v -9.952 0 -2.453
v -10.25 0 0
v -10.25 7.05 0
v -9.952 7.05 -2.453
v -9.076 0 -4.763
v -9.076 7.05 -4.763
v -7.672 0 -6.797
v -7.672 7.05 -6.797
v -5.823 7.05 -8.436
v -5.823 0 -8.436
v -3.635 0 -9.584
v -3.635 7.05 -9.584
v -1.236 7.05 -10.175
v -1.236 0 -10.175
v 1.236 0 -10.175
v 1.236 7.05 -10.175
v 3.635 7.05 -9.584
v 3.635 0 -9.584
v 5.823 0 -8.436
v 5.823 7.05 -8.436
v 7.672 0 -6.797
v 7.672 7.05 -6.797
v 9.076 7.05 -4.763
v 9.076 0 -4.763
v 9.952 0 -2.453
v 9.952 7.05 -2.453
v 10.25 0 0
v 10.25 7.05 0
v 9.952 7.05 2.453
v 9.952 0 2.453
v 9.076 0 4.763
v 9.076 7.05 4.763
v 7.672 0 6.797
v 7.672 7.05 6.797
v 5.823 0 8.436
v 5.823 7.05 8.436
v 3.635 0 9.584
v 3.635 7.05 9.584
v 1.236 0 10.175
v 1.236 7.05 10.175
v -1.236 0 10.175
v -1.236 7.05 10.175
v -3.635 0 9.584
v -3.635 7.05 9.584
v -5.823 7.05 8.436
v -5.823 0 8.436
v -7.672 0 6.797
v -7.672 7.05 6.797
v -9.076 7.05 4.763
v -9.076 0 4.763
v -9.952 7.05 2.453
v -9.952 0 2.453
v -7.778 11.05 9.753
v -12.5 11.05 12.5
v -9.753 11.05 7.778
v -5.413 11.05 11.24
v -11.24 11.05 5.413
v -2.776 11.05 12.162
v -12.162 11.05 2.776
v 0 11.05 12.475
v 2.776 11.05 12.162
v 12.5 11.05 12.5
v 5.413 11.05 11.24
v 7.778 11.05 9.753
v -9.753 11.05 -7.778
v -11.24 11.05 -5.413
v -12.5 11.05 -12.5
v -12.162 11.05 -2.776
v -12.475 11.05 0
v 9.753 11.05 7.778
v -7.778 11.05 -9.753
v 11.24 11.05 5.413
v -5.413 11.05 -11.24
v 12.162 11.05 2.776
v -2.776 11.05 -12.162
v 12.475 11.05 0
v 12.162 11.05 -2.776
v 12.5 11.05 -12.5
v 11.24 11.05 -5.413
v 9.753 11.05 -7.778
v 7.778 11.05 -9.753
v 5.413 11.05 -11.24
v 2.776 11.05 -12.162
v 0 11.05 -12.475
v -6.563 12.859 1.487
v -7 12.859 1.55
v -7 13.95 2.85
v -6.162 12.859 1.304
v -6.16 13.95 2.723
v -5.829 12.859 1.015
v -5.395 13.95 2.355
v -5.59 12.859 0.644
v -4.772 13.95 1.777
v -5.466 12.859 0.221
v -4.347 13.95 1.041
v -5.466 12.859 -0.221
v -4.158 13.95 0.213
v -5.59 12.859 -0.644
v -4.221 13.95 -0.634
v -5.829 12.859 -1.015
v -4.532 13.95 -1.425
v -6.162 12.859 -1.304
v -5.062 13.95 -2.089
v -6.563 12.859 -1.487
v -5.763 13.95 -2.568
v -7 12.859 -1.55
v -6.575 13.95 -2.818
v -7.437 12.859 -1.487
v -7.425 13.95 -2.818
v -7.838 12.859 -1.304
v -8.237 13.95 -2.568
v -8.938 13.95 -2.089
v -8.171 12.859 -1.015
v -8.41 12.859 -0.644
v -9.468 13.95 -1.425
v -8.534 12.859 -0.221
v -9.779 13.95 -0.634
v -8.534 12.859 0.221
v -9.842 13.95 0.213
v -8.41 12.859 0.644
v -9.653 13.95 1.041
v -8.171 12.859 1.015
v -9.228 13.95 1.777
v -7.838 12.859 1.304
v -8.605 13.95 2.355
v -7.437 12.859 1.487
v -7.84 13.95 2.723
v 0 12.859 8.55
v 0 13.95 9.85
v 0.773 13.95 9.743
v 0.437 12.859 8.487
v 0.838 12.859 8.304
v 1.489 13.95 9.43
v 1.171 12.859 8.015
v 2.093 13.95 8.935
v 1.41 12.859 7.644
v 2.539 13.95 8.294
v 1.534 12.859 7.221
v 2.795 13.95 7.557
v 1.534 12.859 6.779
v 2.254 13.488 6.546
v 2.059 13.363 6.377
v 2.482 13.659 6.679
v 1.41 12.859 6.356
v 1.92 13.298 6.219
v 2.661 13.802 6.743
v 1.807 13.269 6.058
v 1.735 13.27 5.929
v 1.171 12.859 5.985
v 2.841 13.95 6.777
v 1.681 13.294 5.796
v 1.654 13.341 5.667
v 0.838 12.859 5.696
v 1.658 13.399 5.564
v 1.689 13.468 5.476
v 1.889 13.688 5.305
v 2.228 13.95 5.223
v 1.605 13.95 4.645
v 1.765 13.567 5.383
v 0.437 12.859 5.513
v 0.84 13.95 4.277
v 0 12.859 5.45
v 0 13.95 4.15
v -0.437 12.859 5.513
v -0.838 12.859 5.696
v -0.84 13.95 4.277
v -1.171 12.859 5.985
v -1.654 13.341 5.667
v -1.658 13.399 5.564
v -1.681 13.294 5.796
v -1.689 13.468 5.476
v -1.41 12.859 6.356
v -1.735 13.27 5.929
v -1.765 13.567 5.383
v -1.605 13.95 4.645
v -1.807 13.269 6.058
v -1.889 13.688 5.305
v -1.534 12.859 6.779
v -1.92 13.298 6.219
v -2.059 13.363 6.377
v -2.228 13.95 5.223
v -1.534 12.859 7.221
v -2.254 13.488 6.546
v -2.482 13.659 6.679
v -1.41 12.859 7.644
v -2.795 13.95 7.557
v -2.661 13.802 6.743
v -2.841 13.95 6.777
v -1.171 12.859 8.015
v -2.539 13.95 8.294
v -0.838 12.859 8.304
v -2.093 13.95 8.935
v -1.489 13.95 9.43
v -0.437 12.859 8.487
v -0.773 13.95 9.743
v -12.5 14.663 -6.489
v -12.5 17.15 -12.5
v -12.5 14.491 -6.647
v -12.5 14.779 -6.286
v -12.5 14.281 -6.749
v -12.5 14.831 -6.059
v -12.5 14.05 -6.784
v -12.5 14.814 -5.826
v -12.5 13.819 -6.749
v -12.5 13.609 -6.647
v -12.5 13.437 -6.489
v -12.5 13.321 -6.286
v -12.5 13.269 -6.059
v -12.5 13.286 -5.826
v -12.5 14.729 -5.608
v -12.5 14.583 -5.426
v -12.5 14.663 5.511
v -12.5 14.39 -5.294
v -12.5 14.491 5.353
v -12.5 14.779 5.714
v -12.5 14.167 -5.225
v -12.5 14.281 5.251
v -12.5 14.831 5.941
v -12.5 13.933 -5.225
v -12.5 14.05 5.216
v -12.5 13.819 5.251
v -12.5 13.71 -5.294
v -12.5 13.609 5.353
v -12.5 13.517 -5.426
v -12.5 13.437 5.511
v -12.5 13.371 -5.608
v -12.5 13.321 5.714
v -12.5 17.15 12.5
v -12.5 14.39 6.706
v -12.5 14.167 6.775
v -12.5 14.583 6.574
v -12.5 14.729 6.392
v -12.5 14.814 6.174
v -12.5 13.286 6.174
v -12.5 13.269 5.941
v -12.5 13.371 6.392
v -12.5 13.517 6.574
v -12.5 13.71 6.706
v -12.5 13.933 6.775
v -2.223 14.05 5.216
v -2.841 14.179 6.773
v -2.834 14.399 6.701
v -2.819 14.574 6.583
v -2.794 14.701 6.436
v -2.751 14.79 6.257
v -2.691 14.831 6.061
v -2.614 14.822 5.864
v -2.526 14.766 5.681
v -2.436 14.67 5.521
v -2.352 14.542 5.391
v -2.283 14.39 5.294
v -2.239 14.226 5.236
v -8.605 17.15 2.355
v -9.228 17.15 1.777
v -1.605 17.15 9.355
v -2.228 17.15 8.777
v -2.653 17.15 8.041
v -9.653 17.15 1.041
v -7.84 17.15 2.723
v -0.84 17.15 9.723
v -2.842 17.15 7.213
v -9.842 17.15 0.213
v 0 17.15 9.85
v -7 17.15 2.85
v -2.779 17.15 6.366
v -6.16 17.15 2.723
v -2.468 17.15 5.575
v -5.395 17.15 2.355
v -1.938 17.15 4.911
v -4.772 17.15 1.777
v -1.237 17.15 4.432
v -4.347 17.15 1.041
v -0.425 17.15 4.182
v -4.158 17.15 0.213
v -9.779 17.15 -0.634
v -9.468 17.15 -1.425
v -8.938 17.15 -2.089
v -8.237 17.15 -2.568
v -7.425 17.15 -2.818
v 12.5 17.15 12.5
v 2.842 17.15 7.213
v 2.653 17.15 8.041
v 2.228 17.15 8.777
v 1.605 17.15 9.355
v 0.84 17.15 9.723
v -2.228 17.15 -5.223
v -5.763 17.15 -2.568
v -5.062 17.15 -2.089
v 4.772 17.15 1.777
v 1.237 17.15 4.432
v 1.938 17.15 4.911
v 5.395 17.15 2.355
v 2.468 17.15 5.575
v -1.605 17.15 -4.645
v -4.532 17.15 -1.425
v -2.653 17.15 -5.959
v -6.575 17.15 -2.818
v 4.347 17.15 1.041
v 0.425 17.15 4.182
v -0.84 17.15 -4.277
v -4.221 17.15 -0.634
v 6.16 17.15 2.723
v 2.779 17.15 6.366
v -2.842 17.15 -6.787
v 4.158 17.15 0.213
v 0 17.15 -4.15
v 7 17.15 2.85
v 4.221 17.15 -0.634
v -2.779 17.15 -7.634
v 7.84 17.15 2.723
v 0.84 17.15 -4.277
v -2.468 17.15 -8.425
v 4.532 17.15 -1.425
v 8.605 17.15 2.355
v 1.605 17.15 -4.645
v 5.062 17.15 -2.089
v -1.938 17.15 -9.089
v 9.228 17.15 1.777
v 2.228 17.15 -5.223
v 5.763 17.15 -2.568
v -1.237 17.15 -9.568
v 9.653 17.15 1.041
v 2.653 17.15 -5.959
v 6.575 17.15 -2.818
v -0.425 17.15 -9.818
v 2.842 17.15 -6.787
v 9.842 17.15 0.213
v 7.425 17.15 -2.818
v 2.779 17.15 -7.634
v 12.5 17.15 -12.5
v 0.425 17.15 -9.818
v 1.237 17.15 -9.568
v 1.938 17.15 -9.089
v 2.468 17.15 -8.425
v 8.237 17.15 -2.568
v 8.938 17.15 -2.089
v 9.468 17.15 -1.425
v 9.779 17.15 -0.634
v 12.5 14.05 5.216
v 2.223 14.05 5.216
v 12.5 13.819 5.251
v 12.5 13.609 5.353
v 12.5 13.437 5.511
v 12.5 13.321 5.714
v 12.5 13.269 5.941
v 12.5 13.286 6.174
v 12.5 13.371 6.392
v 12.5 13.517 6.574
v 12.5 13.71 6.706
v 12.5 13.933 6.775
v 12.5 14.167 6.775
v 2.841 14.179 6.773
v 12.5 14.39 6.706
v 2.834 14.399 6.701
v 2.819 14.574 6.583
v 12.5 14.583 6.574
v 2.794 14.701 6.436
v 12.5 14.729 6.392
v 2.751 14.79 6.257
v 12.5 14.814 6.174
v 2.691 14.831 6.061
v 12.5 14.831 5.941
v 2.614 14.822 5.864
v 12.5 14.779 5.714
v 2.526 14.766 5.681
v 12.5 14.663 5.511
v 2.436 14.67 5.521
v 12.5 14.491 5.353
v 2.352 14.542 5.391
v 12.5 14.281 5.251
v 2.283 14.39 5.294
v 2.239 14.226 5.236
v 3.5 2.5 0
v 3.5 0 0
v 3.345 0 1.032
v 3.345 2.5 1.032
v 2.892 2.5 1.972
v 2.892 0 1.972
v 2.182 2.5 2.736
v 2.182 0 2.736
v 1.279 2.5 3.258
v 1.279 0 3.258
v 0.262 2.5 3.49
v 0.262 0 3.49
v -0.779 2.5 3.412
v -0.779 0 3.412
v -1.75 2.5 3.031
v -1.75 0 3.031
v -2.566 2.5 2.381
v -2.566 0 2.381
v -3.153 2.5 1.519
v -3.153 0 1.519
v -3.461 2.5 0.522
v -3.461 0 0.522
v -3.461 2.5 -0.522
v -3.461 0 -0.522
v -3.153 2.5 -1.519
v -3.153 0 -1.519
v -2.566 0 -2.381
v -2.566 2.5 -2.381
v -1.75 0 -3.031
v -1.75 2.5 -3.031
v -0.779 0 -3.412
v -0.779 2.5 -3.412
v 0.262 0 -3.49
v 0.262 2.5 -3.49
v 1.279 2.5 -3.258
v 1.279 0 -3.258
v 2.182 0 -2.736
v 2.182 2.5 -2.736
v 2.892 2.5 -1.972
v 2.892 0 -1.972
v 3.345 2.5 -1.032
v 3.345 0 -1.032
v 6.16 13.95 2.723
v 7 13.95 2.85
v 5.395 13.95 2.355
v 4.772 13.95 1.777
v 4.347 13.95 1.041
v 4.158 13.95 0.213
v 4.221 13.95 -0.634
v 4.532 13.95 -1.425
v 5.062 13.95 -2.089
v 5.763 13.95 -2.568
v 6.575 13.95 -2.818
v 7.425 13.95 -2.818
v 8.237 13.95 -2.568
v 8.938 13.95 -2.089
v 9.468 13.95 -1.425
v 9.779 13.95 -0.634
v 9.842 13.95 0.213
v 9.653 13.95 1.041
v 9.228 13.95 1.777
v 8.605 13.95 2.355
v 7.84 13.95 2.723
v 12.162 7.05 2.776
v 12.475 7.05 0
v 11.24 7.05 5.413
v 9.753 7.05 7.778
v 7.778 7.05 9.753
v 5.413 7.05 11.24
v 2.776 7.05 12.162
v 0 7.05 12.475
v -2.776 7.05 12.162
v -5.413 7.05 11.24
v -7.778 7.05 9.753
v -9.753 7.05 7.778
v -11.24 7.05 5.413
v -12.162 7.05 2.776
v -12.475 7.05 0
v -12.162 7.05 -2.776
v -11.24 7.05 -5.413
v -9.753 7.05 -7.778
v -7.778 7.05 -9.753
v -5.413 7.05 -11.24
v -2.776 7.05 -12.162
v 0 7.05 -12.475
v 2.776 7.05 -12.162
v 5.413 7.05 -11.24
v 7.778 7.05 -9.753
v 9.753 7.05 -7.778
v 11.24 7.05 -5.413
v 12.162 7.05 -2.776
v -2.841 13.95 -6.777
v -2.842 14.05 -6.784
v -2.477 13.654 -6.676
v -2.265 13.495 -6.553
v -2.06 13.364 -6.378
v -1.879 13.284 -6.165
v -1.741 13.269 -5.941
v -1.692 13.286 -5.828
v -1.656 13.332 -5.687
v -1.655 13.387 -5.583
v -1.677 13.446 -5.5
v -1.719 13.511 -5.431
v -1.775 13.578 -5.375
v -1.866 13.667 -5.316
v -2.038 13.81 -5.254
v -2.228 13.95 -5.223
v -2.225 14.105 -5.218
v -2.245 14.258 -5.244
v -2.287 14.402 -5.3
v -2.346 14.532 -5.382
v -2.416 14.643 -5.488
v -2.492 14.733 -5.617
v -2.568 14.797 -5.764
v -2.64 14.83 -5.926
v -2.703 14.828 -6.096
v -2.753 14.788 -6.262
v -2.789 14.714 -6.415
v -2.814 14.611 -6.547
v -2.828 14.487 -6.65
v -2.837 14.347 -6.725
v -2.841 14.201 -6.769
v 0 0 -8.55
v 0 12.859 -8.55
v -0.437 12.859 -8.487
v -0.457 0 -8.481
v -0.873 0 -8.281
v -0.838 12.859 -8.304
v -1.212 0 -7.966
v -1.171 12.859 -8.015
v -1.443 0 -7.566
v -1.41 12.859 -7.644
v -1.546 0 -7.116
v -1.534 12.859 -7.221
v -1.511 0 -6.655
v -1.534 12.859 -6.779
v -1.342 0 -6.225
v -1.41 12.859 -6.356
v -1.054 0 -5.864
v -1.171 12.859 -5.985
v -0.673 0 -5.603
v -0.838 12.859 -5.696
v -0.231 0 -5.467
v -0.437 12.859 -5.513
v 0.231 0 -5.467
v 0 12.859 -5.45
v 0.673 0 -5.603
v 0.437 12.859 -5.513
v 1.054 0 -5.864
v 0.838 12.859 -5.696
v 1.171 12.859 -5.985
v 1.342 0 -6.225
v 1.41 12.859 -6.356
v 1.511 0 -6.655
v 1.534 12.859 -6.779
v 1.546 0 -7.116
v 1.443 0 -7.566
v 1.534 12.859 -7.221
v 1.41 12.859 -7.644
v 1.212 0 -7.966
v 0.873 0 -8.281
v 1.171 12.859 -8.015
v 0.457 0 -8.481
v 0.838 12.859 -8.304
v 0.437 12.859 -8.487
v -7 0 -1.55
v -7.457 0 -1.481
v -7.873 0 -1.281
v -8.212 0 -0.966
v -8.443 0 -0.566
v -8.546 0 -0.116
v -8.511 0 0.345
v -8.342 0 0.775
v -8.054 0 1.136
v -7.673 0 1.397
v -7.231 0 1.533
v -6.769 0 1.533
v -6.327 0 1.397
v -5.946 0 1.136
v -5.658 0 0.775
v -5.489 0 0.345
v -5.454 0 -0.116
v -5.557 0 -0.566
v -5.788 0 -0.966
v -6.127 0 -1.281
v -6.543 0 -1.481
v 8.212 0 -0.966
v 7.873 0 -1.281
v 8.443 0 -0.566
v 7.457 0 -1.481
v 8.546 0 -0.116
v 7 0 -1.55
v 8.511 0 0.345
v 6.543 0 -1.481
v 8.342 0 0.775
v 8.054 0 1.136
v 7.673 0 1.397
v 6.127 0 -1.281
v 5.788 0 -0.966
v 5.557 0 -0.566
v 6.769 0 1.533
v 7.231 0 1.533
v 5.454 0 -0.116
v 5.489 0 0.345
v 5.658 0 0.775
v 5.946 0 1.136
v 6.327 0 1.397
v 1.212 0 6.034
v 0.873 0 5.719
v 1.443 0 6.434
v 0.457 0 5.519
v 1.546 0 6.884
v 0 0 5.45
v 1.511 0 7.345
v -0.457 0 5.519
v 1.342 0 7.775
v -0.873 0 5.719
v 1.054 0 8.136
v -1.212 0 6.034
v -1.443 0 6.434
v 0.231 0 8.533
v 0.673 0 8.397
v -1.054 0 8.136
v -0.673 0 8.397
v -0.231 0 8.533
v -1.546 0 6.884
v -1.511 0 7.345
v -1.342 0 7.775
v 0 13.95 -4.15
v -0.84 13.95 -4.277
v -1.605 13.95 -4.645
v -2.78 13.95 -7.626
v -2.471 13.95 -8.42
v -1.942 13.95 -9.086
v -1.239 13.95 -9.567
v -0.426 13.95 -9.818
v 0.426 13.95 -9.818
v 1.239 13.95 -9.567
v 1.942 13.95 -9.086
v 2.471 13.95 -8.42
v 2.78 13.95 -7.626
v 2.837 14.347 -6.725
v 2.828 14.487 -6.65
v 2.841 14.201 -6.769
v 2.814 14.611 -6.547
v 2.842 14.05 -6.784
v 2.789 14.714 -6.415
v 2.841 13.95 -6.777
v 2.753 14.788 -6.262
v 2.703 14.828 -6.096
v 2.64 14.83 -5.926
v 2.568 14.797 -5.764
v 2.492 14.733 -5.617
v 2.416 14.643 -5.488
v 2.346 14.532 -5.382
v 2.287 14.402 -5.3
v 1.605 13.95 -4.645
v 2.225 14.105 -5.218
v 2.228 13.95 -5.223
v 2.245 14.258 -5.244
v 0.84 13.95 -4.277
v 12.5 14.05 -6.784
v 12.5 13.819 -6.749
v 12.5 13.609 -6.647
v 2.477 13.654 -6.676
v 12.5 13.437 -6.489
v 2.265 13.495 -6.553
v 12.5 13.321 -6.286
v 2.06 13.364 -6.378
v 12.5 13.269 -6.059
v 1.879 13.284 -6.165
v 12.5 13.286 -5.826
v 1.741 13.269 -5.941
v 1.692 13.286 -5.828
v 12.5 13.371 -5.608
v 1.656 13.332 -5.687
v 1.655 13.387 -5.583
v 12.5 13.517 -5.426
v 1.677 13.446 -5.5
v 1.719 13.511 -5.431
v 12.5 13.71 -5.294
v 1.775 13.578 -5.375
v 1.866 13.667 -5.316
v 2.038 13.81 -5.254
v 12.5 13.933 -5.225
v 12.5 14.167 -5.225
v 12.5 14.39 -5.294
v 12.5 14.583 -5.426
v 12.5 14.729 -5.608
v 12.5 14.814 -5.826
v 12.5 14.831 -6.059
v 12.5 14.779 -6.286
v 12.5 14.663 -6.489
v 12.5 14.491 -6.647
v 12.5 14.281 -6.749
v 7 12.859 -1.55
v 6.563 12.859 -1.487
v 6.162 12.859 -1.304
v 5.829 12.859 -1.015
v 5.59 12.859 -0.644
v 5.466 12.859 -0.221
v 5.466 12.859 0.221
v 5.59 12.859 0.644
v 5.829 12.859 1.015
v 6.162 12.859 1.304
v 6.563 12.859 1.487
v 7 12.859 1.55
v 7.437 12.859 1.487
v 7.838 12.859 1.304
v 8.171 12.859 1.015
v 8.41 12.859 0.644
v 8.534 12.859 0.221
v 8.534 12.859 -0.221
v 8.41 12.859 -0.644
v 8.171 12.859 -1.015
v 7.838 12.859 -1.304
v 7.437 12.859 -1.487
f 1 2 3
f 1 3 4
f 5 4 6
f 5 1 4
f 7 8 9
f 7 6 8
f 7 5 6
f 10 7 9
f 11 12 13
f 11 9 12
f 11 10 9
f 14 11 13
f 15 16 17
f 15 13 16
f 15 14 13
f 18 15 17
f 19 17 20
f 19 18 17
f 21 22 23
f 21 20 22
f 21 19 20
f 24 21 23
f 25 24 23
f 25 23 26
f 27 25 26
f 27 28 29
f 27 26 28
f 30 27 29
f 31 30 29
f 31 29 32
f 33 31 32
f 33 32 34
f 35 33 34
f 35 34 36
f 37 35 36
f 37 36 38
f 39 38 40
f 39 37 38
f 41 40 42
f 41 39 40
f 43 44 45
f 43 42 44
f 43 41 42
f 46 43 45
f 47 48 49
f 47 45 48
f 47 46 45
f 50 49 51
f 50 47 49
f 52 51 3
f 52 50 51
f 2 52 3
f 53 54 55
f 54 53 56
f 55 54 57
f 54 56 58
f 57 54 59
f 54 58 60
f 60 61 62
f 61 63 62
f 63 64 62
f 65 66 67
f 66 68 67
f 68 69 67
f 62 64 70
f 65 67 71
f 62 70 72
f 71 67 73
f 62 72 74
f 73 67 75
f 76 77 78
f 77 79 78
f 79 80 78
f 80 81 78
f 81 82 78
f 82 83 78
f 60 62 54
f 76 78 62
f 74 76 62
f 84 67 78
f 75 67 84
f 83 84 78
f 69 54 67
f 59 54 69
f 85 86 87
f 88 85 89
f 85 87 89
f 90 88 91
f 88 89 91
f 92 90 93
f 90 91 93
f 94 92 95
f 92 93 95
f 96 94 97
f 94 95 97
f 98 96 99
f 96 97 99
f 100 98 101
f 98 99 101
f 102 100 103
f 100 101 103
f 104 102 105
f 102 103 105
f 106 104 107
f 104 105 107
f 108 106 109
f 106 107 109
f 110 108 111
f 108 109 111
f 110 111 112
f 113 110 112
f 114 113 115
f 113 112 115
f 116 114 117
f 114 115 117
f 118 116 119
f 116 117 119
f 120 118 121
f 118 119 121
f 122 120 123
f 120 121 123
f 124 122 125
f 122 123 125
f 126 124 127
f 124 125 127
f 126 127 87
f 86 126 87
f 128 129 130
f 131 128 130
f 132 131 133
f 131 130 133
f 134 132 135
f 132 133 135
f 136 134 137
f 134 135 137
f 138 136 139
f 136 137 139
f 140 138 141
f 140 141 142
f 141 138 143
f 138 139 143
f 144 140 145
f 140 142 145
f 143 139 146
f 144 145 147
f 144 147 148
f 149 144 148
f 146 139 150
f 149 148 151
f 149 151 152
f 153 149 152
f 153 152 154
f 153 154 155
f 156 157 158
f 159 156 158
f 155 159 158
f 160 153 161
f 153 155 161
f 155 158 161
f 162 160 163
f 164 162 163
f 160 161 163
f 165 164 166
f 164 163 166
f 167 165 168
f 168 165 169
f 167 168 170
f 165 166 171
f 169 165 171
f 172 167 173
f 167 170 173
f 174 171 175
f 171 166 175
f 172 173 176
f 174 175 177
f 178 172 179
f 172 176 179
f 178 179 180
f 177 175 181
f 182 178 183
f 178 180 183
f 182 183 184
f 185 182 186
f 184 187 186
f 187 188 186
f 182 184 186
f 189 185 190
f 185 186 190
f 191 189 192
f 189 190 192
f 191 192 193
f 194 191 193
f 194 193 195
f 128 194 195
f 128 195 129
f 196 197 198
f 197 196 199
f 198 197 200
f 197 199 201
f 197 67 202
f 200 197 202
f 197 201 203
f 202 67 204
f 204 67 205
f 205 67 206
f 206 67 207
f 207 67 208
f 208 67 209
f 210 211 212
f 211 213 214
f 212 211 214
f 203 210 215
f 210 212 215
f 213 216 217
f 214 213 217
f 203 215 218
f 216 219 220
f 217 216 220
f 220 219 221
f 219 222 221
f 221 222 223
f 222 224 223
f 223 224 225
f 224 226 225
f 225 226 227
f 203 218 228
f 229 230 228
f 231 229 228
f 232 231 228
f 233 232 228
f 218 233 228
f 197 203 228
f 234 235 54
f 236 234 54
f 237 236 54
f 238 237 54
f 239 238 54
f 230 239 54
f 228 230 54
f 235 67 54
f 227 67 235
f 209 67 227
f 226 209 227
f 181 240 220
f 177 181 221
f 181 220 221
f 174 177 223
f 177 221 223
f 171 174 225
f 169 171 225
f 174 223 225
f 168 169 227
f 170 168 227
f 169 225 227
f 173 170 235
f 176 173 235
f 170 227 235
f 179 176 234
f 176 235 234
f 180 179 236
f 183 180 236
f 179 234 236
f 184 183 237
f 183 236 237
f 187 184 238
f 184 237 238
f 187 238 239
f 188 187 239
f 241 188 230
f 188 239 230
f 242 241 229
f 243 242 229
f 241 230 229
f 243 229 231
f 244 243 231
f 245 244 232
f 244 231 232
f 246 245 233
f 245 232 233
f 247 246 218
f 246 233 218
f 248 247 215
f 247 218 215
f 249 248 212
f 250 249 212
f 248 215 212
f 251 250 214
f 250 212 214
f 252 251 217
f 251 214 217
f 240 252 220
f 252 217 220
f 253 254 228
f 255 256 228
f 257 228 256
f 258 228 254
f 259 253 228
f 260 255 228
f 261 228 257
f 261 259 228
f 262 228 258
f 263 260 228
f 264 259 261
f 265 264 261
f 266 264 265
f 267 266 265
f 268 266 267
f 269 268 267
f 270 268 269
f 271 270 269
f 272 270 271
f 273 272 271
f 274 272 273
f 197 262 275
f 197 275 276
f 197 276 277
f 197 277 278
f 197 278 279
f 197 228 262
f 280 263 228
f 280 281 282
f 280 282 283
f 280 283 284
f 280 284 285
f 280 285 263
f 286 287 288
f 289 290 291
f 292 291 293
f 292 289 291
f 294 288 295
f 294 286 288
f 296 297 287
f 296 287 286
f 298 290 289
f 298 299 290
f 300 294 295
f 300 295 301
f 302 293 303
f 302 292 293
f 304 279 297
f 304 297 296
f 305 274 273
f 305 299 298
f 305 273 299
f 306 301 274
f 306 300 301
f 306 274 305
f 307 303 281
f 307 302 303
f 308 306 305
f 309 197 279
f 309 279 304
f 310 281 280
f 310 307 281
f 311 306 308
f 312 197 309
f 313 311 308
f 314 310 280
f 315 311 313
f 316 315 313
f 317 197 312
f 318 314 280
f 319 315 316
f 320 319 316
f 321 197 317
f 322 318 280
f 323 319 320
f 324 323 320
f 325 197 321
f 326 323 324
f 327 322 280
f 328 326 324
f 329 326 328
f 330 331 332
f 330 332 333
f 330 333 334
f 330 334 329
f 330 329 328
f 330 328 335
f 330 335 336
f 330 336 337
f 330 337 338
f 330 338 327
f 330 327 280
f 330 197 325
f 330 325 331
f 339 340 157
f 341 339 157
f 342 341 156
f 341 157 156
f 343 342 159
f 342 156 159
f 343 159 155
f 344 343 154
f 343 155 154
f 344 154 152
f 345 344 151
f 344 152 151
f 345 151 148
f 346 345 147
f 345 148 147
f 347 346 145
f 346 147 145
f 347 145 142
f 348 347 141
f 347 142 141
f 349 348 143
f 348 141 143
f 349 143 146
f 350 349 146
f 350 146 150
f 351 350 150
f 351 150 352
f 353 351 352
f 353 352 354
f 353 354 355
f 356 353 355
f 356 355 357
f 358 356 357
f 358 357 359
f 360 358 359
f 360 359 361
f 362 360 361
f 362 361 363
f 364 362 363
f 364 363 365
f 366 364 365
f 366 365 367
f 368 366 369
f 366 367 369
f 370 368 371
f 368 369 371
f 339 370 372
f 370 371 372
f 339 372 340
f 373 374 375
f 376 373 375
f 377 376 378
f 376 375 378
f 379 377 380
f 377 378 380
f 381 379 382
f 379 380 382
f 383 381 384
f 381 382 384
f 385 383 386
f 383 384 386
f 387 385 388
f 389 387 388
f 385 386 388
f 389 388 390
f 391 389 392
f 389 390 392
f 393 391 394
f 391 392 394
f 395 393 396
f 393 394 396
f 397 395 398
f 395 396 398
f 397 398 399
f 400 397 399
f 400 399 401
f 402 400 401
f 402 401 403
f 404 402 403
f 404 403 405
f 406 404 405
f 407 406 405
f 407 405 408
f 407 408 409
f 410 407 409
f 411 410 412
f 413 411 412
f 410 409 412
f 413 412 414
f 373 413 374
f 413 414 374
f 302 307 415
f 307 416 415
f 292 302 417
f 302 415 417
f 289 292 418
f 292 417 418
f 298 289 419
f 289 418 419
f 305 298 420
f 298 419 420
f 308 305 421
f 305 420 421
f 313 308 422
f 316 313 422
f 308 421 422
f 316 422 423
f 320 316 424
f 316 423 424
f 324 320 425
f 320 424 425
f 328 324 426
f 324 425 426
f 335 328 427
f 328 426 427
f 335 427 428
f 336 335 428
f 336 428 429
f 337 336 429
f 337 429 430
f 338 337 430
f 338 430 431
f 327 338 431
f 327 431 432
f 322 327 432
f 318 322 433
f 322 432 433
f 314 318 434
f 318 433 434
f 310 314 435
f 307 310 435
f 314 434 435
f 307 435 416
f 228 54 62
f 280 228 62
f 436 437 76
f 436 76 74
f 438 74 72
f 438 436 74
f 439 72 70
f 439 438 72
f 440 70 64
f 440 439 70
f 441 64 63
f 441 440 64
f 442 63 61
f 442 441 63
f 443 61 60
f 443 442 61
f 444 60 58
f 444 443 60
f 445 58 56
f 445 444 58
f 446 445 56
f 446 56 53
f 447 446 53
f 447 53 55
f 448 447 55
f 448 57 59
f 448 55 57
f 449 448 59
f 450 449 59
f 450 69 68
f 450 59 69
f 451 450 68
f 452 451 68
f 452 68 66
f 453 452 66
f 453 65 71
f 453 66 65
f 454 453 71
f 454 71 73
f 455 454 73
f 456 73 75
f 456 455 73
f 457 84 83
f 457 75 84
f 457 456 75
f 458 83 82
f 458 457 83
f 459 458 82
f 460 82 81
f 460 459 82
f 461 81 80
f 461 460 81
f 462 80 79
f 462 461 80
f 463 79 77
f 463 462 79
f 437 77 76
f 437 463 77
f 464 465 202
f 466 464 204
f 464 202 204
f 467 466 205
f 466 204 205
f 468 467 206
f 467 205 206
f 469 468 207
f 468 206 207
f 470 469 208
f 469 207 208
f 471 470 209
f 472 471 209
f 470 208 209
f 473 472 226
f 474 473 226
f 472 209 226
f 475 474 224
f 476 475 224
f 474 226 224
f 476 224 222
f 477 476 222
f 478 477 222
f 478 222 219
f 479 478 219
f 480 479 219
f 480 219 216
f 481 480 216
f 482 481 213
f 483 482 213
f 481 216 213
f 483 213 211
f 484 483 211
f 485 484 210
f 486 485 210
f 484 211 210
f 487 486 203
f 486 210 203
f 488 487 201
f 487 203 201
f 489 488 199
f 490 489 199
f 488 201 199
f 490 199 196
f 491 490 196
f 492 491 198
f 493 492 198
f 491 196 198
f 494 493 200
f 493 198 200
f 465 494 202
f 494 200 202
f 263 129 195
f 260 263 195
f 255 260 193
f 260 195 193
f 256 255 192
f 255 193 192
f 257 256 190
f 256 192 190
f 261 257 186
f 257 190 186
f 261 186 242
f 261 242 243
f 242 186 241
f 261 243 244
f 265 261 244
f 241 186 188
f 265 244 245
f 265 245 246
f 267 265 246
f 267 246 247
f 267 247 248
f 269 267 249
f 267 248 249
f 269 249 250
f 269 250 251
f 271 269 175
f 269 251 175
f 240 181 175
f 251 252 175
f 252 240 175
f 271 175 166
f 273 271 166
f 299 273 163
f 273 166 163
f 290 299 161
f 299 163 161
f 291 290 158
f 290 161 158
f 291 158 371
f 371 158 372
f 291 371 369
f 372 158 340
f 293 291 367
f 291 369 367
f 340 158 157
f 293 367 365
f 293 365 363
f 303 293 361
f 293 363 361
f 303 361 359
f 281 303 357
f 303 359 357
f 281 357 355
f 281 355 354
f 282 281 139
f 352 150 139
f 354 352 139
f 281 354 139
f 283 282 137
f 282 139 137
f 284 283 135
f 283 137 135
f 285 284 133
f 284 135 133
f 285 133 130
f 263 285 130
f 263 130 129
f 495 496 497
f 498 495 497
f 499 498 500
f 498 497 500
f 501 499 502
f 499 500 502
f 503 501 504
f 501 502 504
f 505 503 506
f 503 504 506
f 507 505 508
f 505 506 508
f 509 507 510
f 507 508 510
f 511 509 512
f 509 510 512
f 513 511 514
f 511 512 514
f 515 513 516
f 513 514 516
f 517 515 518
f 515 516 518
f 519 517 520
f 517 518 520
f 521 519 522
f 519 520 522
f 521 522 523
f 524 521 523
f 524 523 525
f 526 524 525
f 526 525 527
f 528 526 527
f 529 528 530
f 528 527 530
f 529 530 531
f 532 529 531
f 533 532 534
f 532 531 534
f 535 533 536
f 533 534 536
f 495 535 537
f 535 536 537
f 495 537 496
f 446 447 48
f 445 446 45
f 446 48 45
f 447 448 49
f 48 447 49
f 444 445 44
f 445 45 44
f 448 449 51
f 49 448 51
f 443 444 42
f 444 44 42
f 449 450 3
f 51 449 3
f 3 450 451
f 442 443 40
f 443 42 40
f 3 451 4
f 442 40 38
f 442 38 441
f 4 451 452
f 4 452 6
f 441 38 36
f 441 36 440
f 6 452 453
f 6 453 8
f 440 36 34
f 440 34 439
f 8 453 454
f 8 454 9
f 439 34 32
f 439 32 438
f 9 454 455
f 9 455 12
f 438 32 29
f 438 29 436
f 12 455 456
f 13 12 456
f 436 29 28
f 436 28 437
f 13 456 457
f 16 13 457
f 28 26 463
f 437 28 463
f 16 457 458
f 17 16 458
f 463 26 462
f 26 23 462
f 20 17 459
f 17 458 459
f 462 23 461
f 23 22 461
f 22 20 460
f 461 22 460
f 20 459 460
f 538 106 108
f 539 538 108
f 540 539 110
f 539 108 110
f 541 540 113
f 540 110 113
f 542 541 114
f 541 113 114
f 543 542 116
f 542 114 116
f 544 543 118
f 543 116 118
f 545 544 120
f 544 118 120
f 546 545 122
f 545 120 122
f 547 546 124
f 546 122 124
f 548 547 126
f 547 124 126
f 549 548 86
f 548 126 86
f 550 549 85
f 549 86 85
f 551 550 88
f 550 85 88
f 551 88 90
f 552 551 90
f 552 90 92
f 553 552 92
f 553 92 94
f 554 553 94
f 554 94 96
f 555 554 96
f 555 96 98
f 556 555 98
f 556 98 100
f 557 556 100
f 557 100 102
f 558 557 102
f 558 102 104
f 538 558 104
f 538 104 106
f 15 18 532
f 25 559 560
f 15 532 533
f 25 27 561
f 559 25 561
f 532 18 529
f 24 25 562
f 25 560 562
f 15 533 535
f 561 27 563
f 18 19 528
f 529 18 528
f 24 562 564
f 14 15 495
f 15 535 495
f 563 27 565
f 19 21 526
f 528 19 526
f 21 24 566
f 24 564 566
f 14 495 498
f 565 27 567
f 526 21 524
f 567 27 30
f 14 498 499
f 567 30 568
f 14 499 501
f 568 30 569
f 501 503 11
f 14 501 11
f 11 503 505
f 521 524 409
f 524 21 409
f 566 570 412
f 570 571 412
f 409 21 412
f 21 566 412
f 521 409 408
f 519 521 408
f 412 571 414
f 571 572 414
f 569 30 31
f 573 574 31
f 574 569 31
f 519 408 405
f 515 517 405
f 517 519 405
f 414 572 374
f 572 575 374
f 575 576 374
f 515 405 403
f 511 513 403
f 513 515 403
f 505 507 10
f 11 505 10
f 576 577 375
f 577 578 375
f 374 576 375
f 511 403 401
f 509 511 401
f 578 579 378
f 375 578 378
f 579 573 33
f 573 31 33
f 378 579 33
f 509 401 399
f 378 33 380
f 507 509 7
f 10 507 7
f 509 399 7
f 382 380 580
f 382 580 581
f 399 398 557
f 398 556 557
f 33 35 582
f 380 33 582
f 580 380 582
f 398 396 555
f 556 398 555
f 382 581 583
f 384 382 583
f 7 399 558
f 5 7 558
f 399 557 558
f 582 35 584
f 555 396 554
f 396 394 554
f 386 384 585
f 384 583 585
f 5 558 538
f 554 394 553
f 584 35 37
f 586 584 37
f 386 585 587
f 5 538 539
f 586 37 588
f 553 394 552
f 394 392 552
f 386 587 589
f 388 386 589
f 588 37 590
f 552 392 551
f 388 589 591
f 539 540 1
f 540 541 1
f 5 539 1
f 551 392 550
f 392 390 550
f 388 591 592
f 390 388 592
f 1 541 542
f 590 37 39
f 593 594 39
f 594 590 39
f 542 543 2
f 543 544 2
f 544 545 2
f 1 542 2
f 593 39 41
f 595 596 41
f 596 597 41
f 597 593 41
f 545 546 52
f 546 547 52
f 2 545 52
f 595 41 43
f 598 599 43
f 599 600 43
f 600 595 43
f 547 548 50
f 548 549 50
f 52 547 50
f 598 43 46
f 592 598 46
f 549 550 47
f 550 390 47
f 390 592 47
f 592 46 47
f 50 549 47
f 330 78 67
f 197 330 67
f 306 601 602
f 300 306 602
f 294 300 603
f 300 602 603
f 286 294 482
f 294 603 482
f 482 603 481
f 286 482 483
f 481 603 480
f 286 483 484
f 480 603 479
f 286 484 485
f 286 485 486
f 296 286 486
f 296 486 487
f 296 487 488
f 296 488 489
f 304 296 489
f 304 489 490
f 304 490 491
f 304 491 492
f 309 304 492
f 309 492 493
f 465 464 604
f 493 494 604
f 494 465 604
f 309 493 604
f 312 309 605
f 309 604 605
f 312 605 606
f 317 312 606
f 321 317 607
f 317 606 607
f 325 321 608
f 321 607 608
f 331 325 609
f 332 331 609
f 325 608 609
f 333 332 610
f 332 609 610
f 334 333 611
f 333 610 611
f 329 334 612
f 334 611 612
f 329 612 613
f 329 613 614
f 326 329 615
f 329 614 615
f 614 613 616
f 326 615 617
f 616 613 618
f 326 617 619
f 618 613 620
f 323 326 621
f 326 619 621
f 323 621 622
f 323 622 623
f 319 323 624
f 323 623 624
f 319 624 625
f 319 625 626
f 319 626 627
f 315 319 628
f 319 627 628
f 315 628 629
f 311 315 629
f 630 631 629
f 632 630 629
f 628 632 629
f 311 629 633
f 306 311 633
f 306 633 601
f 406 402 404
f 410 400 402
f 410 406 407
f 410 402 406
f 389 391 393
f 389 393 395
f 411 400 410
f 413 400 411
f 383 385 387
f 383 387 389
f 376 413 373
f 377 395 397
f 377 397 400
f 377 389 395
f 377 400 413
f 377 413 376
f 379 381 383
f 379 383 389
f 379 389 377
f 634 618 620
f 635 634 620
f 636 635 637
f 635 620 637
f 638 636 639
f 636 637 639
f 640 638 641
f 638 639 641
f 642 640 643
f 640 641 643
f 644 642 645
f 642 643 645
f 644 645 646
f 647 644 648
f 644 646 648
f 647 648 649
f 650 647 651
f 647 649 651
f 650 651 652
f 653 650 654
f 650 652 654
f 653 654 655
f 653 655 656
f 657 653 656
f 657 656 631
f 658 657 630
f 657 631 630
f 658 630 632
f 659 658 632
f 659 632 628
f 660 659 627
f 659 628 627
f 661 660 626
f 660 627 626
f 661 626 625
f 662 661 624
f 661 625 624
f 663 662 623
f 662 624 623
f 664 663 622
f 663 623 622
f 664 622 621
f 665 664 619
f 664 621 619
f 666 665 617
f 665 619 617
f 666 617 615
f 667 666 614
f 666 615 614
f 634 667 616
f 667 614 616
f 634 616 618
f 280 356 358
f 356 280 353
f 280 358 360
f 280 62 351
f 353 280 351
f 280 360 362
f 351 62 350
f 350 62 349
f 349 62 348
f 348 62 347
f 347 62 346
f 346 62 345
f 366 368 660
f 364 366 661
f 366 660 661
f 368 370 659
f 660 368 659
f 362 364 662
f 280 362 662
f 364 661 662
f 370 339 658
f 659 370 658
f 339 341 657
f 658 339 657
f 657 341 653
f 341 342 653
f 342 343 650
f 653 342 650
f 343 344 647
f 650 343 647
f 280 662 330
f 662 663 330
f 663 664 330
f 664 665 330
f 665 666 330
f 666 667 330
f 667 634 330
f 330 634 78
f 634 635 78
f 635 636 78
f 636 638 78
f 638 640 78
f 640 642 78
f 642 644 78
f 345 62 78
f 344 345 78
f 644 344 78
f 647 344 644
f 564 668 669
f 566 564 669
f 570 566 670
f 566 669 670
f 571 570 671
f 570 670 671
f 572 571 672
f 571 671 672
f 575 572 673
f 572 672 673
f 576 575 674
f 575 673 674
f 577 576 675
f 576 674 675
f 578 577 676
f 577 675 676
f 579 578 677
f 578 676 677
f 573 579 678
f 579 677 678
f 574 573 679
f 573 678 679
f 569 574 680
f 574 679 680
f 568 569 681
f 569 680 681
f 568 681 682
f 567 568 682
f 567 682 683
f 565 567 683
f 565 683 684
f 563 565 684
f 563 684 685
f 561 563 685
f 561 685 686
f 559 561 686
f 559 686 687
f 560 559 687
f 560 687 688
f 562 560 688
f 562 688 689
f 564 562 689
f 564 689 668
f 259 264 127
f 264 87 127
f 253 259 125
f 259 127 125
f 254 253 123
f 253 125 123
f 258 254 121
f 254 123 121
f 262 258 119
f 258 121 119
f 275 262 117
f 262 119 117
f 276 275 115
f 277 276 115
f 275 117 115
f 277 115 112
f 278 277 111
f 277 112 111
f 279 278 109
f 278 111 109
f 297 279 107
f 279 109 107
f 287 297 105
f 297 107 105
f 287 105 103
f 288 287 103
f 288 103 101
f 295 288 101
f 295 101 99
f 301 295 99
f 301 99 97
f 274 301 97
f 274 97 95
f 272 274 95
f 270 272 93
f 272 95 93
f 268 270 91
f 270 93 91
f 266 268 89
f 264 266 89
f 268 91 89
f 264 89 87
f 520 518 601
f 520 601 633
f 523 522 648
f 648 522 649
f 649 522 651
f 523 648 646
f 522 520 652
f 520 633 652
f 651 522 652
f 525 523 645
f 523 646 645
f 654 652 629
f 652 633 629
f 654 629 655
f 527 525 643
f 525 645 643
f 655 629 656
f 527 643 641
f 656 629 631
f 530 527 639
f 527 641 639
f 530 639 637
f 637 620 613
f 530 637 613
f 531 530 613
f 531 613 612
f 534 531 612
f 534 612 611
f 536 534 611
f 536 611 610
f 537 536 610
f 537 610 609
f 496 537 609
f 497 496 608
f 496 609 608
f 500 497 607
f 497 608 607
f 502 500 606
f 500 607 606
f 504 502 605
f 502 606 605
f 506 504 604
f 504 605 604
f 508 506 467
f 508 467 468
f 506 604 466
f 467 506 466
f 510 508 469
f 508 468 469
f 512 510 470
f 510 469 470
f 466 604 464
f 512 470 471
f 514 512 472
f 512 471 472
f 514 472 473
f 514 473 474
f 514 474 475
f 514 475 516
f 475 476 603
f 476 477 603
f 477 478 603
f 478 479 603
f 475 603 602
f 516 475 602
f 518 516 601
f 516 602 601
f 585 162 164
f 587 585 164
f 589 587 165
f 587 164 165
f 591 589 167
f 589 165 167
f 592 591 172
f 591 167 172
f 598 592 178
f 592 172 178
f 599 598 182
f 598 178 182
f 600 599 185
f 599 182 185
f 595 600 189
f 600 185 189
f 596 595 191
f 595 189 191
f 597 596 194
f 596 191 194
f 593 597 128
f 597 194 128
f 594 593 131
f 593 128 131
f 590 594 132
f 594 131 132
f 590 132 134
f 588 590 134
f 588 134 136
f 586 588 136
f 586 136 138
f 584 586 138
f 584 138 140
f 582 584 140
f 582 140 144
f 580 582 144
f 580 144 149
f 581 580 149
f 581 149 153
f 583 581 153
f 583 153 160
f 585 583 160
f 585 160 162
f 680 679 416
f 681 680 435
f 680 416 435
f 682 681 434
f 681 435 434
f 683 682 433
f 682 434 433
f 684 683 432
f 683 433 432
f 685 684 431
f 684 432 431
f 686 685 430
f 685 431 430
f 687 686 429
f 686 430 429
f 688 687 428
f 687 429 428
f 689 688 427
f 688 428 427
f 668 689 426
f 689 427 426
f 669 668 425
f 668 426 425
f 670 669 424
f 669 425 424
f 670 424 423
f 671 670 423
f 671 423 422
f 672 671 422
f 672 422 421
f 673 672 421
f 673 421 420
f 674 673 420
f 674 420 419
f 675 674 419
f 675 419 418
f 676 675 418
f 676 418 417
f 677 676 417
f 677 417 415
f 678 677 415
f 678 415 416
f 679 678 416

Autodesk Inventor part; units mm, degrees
ref_plane "YZ Plane" through (0, 0, 0) normal (1, 0, 0) x (0, 1, 0)
ref_plane "XZ Plane" through (0, 0, 0) normal (0, 1, 0) x (-1, 0, 0)
ref_plane "XY Plane" through (0, 0, 0) normal (0, 0, 1) x (1, 0, 0)
sketch "Sketch1" plane through (0, 0, 0) normal (0, 1, 0) x (-1, 0, 0)
  circle A0 centre (0, 0) radius 10.25
  dimension "d0" = 20.5
extrude "Extrusion1" add sketch "Sketch1" along normal blind 7.05
sketch "Sketch2" plane through (0, 7.05, 0) normal (0, 1, 0) x (1, 0, 0)
  circle A0 centre (0, 0) radius 12.475
  dimension "d3" = 24.95
extrude "Extrusion2" add sketch "Sketch2" along normal blind 4
sketch "Sketch3" plane through (0, 11.05, 0) normal (0, 1, 0) x (1, 0, 0)
  circle A0 centre (0, 0) radius 12.475 projected
  line L0 (-12.5, -12.5) -> (12.5, -12.5)
  line L1 (12.5, -12.5) -> (12.5, 12.5)
  line L2 (12.5, 12.5) -> (-12.5, 12.5)
  line L3 (-12.5, 12.5) -> (-12.5, -12.5)
  point P0 (-12.5, 0)
  point P1 (0, -12.5)
  dimension "d6" = 25
  dimension "d7" = 25
extrude "Extrusion3" add sketch "Sketch3" along normal blind 6.1 contours A0 | L3 L2 L1 L0
sketch "Sketch4" plane through (12.5, 11.05, 12.5) normal (1, 0, 0) x (0, 0, -1)
  line L0 (0, 0) -> (25, 0) projected
  line L1 (25, 0) -> (25, 6.1) projected
  line L2 (0, 6.1) -> (25, 6.1) projected
  line L3 (0, 0) -> (0, 6.1) projected
  line L4 (24.975, 0) -> (0.025, 0) projected
  line L5 (6.5, 0) -> (18.5, 0)
  line L6 (18.5, 0) -> (18.5, 3)
  line L7 (18.5, 3) -> (6.5, 3)
  line L8 (6.5, 3) -> (6.5, 0)
  point P0 (12.5, -11.05)
  point P1 (12.5, 3)
  point P2 (12.5, 0)
  point P3 (12.5, 0)
  dimension "d10" = 12
  dimension "d11" = 3
hole "Hole1" at (12.5, 14.05, 6) at (12.5, 14.05, -6) direction (-1, 0, 0) diameter 1.567 end through all thread size "M2x0.4" class "6H" standard "ANSI Metric M Profile"
sketch "Sketch5" plane through (0, 0, 0) normal (0, -1, 0) x (1, 0, 0)
  circle A0 centre (0, 0) radius 3.5
  dimension "d19" = 7
extrude "Extrusion4" cut sketch "Sketch5" against normal blind 2.5
sketch "Sketch6" plane through (0, 0, 0) normal (0, -1, 0) x (1, 0, 0)
  circle A0 centre (0, 0) radius 7
  line L0 (0, 7) -> (-7, 0)
  line L1 (-7, 0) -> (0, -7)
  line L2 (0, -7) -> (7, 0)
  line L3 (7, 0) -> (0, 7)
  dimension "d22" = 14
hole "Hole2" at (0, 0, 7) at (-7, 0, 0) at (0, 0, -7) at (7, 0, 0) direction (0, 1, 0) diameter 3.1 end through all clearance for "Flat Head Machine Screw" size "M3" standard "Ansi Metric M Profile"
sketch "Sketch7" plane through (0, 17.15, 0) normal (0, 1, 0) x (1, 0, 0)
  circle A0 centre (0, 7) radius 1.55 projected
  circle A1 centre (0, -7) radius 1.55 projected
  circle A2 centre (-7, 0) radius 1.55 projected
  circle A3 centre (7, 0) radius 1.55 projected
  line L0 (-12.5, -12.5) -> (12.5, -12.5) projected
  line L1 (12.5, -12.5) -> (12.5, 12.5) projected
  line L2 (12.5, 12.5) -> (-12.5, 12.5) projected
  line L3 (-12.5, 12.5) -> (-12.5, -12.5) projected
  point P0 (0, 0)
hole "Hole3" at (0, 17.15, 7) at (7, 17.15, 0) at (0, 17.15, -7) at (-7, 17.15, 0) direction (0, -1, 0) diameter 5.7 depth 3.2 tip angle 100
equation "\"d7\" = d6"
properties part number "c_axisrot"
